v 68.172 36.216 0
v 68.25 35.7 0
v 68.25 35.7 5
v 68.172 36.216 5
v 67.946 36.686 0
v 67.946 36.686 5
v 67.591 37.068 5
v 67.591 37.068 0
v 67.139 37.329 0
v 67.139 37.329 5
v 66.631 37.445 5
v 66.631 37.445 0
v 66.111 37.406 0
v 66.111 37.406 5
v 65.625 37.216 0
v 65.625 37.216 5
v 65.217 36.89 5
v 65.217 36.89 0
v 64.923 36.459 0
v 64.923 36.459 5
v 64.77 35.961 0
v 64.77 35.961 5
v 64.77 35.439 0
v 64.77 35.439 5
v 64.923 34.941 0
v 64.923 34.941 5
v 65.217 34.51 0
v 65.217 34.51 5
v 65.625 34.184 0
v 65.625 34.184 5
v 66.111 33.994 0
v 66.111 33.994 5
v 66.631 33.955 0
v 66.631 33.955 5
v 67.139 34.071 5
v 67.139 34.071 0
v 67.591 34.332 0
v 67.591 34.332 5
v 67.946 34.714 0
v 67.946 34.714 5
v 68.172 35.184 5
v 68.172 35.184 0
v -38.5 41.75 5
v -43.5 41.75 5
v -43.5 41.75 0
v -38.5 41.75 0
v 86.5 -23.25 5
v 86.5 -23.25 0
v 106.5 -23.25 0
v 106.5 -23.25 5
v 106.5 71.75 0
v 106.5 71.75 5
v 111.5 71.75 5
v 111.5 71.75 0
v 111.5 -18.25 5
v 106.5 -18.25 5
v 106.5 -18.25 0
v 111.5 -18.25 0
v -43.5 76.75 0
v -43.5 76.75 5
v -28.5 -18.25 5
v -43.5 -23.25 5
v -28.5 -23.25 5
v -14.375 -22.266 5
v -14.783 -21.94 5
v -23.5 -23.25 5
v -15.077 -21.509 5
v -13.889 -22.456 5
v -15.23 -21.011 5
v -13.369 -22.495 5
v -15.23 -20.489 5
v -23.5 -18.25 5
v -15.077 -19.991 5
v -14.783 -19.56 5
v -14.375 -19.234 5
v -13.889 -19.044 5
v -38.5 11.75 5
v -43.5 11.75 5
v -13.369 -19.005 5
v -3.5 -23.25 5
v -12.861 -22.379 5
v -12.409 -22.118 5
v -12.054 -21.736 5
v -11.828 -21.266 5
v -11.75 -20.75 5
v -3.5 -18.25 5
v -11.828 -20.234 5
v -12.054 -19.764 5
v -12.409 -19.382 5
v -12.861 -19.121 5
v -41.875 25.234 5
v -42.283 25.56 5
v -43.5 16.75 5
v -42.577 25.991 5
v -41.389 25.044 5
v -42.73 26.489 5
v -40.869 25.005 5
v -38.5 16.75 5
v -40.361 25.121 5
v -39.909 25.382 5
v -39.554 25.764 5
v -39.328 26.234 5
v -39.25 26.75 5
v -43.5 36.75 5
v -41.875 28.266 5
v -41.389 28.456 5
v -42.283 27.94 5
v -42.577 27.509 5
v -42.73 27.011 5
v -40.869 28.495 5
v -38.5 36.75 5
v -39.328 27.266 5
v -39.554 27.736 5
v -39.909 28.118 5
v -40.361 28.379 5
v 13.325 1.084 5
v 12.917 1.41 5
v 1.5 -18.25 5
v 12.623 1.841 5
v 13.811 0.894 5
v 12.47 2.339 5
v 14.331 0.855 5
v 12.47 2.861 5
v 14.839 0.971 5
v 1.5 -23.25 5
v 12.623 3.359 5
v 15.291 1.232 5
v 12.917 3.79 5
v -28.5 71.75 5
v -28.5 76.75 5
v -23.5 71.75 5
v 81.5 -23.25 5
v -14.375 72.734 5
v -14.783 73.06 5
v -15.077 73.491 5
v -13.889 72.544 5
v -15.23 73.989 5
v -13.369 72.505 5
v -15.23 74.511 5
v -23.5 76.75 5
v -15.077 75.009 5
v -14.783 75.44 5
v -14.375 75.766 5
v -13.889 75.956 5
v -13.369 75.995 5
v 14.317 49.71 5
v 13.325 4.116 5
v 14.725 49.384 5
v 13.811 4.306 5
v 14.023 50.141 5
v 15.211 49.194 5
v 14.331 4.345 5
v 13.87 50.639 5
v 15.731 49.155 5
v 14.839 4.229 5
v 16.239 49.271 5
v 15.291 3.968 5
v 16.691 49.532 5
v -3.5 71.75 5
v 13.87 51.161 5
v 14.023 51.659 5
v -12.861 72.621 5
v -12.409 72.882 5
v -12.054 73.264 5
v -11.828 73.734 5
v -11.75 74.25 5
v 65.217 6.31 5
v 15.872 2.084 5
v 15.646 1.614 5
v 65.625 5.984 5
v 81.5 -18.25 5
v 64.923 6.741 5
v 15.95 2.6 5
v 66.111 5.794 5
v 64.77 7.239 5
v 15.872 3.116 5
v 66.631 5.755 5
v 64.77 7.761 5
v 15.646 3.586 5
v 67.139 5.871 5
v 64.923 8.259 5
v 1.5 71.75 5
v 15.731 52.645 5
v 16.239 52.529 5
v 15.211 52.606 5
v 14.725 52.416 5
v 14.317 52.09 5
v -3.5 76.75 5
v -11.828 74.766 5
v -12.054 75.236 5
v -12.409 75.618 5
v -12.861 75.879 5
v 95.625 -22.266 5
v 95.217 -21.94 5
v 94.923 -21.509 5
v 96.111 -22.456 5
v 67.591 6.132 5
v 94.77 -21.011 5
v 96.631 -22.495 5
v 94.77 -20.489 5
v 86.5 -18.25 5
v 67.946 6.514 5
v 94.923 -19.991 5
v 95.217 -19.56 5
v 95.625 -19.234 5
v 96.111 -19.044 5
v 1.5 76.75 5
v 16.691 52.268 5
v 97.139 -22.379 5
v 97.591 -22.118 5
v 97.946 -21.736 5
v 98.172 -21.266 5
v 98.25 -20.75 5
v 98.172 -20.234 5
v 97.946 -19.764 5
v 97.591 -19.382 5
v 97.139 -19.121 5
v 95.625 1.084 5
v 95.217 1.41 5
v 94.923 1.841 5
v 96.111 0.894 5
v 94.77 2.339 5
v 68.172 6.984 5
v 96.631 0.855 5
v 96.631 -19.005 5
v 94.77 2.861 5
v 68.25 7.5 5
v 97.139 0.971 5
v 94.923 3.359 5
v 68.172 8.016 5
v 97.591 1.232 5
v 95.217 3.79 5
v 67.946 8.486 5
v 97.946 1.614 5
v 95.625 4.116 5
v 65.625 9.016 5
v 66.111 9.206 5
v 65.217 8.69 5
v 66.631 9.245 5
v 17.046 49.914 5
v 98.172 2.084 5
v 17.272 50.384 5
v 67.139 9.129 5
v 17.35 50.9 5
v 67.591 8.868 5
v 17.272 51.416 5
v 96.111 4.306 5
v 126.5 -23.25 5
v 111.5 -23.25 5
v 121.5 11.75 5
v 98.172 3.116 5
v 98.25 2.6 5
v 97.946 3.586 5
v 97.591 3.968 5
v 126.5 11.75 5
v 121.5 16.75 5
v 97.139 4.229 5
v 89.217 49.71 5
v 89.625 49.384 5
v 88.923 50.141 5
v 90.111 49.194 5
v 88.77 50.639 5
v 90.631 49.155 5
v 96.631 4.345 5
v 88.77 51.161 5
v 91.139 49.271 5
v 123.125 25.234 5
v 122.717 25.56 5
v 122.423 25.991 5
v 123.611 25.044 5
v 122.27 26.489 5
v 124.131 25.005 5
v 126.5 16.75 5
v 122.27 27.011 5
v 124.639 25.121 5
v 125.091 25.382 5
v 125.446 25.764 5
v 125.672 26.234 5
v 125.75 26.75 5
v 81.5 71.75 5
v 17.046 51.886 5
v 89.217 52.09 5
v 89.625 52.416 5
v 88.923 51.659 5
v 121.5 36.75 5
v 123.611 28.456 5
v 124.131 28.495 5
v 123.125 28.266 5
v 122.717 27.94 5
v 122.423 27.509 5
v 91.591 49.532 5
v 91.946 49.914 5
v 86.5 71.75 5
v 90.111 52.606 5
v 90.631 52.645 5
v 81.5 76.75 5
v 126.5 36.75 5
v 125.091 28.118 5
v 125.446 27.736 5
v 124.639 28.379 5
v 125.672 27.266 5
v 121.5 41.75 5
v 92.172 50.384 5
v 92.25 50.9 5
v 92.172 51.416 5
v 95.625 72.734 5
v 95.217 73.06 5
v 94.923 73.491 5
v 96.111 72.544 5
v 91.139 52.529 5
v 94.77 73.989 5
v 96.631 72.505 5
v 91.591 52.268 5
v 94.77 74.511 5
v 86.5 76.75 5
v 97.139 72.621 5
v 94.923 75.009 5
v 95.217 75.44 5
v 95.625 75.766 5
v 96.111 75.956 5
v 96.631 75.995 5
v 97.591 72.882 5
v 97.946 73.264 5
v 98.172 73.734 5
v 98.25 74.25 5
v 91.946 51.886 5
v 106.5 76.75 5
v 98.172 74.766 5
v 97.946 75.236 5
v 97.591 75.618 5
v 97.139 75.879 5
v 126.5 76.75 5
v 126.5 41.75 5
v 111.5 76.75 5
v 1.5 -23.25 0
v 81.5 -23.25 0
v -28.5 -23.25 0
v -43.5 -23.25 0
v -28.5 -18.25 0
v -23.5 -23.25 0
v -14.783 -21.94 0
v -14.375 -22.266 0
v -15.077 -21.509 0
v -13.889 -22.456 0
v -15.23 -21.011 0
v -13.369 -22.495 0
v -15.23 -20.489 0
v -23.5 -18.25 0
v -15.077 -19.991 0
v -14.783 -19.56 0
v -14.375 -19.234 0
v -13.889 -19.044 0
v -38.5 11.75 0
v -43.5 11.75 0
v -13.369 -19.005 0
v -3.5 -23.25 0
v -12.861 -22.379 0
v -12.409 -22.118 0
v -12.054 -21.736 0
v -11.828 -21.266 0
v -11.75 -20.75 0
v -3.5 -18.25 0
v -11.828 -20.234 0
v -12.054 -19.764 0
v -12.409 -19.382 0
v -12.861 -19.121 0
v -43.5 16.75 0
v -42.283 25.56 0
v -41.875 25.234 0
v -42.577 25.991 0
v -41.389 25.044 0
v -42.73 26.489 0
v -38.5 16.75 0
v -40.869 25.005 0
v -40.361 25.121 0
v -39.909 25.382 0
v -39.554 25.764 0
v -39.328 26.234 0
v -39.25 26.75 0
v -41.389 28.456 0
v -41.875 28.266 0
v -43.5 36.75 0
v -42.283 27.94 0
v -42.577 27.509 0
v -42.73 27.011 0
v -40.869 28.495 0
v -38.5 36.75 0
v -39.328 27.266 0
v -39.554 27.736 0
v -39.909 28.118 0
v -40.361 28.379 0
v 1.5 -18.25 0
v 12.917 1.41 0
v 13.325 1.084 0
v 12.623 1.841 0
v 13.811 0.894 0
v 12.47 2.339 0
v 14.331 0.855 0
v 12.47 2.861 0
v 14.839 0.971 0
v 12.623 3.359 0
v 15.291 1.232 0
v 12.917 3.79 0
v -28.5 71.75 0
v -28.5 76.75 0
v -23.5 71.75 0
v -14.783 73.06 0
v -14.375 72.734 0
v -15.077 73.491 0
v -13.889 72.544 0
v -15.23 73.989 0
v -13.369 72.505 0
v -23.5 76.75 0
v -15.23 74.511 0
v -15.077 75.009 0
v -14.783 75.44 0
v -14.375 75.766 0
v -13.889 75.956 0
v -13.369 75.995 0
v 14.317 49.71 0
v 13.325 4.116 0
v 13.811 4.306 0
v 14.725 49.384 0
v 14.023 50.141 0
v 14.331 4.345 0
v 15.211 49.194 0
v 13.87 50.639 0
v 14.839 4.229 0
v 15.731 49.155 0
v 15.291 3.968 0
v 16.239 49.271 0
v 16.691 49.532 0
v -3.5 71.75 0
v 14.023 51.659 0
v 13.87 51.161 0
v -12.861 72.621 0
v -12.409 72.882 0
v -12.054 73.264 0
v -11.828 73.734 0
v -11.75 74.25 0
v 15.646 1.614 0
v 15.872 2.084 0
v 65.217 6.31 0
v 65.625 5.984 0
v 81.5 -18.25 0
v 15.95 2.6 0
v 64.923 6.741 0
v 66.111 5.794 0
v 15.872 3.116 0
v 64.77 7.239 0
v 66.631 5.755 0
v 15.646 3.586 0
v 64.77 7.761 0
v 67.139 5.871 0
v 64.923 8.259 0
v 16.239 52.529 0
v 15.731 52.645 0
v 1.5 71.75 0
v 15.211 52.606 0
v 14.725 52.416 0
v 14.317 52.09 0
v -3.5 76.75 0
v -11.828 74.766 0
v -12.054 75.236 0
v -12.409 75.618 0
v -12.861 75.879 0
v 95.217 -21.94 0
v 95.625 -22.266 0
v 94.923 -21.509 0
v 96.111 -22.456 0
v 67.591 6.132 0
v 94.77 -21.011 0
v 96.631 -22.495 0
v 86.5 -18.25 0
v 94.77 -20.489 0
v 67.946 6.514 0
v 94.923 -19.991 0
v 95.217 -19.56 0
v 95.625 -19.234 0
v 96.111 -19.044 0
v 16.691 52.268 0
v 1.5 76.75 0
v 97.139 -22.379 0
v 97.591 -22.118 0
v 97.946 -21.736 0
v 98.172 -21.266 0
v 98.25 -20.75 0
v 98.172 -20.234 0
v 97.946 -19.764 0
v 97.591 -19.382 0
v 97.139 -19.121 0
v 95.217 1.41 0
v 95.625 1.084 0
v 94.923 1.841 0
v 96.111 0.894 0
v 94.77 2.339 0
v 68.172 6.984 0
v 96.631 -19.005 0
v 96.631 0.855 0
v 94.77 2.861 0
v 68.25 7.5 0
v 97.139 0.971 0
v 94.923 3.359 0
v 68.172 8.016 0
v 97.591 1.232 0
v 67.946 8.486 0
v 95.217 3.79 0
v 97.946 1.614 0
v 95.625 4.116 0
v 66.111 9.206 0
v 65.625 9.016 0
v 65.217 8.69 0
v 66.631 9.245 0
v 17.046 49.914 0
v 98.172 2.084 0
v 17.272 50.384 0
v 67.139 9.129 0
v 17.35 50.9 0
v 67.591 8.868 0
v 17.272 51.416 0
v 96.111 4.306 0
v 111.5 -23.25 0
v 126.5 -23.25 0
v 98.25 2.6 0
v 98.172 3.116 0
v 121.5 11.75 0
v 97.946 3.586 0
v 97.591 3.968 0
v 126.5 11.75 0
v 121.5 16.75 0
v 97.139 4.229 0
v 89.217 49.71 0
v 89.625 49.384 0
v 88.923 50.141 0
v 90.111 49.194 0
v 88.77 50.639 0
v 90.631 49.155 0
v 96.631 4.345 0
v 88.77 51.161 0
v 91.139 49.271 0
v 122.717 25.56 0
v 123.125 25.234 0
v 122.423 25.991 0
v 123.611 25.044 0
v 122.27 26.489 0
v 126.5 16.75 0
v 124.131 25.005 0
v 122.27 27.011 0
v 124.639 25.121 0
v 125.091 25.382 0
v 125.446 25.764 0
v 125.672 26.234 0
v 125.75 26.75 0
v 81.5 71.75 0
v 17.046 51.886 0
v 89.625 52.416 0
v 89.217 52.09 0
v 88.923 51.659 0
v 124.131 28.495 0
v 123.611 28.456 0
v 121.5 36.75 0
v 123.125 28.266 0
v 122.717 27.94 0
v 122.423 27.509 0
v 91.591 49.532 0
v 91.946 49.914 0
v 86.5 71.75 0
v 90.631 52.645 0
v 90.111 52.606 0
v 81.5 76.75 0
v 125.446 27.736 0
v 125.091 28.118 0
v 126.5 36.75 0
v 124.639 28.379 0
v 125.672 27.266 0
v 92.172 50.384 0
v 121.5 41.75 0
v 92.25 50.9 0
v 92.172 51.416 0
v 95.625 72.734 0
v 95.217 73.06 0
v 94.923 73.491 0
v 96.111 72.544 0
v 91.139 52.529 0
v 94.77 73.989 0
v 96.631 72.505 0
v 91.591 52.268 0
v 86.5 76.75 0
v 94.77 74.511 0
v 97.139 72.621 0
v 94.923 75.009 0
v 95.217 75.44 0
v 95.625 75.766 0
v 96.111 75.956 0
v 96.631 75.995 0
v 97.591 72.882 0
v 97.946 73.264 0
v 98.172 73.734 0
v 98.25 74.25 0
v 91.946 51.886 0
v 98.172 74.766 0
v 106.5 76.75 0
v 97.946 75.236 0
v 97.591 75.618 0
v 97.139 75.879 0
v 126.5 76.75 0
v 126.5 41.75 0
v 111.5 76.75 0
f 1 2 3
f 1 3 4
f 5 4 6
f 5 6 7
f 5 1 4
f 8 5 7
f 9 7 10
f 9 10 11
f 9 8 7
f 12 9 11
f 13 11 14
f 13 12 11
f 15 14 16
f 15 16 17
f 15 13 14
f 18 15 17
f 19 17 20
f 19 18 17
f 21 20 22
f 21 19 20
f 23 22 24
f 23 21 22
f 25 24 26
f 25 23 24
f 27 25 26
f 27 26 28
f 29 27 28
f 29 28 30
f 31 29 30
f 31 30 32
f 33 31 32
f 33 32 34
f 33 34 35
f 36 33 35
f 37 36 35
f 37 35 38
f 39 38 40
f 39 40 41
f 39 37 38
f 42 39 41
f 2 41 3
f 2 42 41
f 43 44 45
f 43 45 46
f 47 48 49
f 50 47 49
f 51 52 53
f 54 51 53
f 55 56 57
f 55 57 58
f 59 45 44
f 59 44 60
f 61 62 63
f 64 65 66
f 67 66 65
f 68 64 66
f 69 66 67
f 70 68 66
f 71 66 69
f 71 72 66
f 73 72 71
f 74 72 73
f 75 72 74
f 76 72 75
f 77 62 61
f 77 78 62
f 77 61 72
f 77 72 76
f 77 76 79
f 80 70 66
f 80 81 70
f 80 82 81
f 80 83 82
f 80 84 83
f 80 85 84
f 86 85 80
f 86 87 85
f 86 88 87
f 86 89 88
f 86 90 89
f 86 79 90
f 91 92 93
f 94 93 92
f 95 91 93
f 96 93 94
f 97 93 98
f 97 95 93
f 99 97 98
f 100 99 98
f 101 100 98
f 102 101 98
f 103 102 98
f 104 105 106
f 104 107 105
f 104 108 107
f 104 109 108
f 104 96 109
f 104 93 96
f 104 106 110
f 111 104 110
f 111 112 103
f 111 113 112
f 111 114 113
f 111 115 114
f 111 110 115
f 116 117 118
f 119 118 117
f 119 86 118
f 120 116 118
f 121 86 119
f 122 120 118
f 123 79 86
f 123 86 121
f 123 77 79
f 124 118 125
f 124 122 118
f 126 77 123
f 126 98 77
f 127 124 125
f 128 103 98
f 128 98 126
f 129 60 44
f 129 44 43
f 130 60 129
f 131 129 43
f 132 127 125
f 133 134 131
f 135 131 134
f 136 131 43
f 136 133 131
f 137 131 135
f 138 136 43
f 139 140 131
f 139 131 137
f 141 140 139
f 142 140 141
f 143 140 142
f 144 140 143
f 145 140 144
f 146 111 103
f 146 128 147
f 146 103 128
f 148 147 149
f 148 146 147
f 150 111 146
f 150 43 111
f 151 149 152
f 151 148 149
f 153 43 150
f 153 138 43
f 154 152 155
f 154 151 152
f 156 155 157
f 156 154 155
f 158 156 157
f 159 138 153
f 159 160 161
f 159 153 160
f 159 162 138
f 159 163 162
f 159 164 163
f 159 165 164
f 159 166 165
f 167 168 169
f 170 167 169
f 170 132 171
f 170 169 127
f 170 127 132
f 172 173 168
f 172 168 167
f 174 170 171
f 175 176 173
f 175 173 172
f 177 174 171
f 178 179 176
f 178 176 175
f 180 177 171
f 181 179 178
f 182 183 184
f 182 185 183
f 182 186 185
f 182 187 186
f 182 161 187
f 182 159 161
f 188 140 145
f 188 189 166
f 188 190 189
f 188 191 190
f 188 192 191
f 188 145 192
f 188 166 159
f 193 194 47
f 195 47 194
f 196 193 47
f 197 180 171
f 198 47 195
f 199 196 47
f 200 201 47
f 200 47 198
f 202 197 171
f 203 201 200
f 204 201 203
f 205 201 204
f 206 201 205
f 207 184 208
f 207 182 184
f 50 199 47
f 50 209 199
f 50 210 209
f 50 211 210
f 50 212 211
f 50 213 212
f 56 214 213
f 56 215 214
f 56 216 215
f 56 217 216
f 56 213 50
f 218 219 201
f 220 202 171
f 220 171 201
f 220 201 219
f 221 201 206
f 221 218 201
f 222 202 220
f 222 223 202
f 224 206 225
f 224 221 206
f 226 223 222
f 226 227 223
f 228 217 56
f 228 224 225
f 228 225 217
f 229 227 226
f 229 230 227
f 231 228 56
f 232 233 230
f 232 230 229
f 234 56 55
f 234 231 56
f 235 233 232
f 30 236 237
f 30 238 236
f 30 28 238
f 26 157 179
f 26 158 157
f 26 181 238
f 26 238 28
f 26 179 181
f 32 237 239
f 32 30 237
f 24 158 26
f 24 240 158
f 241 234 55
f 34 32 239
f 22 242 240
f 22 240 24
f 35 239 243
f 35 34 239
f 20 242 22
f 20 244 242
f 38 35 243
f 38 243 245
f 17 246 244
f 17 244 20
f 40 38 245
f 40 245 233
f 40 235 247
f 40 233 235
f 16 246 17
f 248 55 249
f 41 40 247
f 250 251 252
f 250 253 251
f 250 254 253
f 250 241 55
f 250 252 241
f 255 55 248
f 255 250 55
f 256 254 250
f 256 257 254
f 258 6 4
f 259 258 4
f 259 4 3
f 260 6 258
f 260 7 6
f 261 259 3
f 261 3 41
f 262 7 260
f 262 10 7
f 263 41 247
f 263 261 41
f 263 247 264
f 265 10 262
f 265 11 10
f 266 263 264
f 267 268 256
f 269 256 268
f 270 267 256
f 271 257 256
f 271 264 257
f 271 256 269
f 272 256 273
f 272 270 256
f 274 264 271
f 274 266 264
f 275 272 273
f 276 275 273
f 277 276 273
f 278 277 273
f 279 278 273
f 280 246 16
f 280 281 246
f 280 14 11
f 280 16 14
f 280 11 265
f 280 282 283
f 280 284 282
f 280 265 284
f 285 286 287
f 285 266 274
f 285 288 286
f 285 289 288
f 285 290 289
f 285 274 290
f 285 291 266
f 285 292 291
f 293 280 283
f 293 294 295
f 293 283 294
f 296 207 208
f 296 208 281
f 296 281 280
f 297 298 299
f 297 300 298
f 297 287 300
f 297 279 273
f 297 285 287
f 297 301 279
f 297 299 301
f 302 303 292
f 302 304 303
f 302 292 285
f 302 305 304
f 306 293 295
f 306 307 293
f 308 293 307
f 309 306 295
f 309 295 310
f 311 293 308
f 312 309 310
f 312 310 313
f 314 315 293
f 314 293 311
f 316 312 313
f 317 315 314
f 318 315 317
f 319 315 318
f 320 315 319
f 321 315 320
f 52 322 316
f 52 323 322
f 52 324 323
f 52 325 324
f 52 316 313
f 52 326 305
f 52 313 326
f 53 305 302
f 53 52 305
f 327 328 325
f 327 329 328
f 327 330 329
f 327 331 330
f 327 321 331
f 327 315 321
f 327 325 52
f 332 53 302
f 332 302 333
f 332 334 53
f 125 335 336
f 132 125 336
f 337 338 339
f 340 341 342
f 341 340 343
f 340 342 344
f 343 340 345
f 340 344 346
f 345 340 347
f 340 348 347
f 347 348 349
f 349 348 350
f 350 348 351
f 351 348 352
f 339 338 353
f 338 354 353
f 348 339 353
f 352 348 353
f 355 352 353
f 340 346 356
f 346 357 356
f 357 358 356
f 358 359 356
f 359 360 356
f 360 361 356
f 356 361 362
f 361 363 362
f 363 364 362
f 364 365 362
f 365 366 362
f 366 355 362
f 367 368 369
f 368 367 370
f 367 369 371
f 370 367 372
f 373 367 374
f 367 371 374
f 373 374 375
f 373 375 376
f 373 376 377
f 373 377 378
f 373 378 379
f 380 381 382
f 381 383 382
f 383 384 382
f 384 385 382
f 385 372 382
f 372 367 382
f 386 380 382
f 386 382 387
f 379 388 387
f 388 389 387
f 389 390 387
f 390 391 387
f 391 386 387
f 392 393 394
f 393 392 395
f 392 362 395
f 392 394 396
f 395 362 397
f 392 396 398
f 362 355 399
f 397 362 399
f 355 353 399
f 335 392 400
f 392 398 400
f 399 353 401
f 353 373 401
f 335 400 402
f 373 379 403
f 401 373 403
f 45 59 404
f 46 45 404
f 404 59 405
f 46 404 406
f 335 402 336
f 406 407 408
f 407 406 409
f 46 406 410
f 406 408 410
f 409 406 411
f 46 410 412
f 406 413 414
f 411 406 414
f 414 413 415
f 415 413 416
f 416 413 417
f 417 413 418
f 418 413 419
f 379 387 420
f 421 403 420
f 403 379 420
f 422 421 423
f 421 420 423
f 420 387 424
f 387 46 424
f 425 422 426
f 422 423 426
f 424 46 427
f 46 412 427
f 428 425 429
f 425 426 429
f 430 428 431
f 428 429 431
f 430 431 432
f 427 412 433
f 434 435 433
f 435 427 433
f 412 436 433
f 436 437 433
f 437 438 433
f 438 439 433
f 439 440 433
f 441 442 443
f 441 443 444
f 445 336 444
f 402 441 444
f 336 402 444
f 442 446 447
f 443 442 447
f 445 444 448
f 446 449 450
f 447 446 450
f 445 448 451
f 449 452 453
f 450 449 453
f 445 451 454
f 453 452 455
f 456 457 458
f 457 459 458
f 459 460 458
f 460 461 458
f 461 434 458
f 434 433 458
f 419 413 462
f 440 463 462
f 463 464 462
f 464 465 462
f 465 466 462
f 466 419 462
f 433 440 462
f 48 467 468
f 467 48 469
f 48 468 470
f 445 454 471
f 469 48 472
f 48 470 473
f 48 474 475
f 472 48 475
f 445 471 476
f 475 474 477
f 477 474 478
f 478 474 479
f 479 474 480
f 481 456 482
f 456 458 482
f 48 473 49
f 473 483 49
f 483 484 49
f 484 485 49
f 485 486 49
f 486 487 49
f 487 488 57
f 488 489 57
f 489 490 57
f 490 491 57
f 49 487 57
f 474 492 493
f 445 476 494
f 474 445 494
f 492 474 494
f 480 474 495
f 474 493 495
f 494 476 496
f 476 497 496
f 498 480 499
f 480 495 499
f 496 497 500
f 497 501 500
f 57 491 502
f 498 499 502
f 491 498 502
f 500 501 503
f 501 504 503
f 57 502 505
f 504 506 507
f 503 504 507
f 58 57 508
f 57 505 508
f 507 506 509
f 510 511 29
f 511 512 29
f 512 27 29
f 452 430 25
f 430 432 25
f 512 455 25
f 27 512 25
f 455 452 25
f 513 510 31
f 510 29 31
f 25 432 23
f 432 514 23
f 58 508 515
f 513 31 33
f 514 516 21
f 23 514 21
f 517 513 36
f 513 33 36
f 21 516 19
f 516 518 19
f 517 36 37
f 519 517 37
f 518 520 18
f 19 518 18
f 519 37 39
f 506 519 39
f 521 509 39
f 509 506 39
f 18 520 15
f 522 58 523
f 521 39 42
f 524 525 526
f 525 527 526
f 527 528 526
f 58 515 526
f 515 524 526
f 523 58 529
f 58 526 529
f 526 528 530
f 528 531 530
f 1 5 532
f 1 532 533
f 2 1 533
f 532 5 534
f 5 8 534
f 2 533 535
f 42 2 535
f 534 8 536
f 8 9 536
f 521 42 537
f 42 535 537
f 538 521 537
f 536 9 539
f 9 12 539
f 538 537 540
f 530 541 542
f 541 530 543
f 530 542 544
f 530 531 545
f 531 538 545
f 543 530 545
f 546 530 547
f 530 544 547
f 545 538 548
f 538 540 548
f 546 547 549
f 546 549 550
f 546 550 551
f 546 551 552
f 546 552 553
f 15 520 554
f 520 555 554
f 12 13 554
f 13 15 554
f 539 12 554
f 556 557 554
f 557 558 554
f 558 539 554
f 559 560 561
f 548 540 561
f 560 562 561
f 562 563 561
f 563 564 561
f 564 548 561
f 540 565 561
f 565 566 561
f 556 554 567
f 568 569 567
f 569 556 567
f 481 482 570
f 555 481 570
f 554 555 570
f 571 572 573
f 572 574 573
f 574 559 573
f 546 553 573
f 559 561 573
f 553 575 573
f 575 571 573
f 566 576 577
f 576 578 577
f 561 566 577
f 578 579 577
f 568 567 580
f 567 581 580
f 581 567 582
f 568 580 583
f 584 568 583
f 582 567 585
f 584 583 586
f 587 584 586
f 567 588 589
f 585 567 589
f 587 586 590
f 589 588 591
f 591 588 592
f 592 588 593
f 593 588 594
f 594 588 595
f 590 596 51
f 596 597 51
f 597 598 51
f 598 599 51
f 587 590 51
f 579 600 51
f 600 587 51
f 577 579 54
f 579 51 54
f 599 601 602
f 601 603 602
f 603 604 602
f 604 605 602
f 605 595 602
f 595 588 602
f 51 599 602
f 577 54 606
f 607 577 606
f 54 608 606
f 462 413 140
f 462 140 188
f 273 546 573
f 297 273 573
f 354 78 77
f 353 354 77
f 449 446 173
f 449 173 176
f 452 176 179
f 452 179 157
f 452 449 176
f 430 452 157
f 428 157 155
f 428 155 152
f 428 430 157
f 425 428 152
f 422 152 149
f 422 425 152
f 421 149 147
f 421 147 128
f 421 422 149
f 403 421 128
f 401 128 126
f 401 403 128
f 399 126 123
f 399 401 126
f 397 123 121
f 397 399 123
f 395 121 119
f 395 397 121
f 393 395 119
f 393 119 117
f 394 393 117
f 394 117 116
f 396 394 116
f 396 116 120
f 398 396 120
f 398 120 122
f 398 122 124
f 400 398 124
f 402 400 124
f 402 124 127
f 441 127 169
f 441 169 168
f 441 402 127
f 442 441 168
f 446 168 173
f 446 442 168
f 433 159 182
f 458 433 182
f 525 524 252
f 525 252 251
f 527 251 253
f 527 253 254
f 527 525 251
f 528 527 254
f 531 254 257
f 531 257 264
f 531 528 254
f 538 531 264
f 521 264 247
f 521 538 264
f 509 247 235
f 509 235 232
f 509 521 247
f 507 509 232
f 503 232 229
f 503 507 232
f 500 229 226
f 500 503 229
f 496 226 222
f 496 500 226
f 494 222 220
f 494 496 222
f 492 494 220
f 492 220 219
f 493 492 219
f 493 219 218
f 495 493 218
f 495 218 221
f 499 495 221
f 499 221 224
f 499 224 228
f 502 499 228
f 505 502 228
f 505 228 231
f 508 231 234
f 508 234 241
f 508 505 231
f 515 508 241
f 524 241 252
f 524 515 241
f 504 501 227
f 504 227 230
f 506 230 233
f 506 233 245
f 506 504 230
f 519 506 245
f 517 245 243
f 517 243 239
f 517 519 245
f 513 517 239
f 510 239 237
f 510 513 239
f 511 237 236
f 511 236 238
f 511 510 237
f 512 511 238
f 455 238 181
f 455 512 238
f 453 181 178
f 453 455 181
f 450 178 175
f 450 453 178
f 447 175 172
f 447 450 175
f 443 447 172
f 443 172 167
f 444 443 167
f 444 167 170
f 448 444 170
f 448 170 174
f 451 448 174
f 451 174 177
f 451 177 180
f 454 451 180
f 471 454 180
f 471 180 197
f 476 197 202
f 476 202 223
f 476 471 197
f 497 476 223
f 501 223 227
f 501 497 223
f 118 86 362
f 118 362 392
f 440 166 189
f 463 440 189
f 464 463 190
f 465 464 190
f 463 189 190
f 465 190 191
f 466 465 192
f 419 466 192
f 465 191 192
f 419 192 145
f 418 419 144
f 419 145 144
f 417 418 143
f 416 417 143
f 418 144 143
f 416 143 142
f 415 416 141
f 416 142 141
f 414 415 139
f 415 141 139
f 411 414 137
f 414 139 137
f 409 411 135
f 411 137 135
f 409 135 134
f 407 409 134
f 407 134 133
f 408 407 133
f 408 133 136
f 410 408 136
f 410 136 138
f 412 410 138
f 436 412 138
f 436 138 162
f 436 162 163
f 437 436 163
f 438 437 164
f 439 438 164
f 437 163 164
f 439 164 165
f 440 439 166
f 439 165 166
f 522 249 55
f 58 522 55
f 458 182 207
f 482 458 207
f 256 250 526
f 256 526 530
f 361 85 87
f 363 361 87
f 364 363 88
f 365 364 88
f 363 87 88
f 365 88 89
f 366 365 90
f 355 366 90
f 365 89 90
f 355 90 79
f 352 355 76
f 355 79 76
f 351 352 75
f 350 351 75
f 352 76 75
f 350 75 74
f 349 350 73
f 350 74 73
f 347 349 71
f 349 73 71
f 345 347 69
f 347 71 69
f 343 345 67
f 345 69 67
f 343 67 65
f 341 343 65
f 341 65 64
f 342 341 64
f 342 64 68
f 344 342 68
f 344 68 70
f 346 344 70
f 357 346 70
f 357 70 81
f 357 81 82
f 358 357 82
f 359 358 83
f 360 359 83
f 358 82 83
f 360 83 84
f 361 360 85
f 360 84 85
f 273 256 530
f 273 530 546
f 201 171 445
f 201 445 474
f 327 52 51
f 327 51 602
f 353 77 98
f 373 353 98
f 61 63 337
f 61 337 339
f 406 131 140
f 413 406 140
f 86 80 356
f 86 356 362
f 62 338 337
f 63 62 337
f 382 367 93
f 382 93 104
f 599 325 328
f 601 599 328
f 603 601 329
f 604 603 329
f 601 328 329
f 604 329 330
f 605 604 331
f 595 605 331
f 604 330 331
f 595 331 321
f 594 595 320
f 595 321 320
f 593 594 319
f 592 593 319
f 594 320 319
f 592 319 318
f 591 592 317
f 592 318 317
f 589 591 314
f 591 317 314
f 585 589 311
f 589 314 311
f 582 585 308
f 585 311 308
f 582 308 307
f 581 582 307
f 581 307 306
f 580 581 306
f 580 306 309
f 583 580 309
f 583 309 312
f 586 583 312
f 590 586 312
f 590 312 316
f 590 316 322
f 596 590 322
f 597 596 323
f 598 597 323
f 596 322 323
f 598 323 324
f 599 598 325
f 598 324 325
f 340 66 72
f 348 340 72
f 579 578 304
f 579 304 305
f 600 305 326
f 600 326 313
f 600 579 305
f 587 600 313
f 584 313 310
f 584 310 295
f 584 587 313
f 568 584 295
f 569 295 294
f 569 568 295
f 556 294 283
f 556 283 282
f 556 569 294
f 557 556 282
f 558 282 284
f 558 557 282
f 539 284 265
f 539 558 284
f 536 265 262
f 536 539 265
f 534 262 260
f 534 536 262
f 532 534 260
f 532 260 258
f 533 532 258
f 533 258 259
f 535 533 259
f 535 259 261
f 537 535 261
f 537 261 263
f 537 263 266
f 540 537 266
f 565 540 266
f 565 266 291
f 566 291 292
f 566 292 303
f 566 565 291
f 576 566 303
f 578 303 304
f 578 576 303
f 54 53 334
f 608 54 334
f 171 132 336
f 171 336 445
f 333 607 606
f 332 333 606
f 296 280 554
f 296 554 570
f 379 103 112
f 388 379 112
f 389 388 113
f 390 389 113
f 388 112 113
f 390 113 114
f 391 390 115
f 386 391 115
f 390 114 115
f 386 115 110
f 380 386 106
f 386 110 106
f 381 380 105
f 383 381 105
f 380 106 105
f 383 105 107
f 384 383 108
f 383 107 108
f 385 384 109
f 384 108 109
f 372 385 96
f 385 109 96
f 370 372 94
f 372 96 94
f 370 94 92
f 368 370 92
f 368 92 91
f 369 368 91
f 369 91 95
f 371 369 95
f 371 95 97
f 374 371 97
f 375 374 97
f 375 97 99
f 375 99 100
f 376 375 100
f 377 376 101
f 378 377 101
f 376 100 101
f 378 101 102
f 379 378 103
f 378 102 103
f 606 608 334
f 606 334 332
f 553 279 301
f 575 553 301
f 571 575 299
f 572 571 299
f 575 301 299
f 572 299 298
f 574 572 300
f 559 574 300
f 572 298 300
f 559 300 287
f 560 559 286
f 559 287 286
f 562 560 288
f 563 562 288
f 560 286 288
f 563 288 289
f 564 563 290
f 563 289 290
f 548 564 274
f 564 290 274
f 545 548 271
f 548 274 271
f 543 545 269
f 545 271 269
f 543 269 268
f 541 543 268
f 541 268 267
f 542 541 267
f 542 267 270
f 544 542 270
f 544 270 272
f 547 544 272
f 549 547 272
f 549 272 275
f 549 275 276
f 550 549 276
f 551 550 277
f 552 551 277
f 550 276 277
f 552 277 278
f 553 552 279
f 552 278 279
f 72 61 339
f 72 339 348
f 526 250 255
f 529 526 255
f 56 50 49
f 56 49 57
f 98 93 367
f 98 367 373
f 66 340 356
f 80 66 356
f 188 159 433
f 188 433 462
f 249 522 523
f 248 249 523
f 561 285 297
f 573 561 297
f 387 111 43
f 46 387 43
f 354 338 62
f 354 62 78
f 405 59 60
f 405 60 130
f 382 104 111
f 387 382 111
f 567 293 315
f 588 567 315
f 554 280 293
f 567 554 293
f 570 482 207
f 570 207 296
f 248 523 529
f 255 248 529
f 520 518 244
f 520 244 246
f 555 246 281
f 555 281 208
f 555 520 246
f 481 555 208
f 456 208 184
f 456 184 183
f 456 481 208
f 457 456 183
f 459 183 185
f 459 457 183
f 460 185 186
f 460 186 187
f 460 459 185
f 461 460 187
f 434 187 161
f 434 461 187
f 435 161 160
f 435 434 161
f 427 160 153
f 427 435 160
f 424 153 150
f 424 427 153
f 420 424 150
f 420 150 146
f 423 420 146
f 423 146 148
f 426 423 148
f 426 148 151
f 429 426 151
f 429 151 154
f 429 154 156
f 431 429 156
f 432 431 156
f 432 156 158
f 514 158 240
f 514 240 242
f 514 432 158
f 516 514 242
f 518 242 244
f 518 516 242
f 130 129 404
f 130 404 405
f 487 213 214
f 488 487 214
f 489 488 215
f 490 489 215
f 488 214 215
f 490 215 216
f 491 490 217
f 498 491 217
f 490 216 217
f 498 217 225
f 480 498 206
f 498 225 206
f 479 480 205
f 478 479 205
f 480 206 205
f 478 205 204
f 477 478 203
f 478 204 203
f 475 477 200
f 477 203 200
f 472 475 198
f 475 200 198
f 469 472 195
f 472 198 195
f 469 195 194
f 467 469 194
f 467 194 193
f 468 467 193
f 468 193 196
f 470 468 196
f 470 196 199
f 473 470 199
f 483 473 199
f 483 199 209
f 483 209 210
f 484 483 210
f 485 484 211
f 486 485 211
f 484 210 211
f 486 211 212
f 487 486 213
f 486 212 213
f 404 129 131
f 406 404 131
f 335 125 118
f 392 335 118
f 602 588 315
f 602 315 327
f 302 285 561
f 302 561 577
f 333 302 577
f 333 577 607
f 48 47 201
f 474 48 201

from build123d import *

# Parameters (mm, degrees)
F1_W     = 170
F1_H     = 100
F1_R     = 1.75
F2_DEPTH = 5
F3_W     = 5
F3_H     = 5
F3_R     = 1.75
F4_DEPTH = 5


with BuildPart() as f2:
    # F1 (on Top) → F2 (new body)
    with BuildSketch(Plane.XY):
        with Locations((41.5, 26.75)):
            Rectangle(F1_W, F1_H)
        with Locations((14.2, 2.6)):
            Circle(F1_R, mode=Mode.SUBTRACT)
        with Locations((66.5, 7.5)):
            Circle(F1_R, mode=Mode.SUBTRACT)
        with Locations((96.5, 2.6)):
            Circle(F1_R, mode=Mode.SUBTRACT)
        with Locations((15.6, 50.9)):
            Circle(F1_R, mode=Mode.SUBTRACT)
        with Locations((66.5, 35.7)):
            Circle(F1_R, mode=Mode.SUBTRACT)
        with Locations((90.5, 50.9)):
            Circle(F1_R, mode=Mode.SUBTRACT)
    extrude(amount=F2_DEPTH)

    # F3 (on face) → F4 (cut, through all)
    with BuildSketch(Plane.XY.offset(5)):
        with Locations((-26, -20.75)):
            Rectangle(F3_W, F3_H)
        with Locations((-1, -20.75)):
            Rectangle(F3_W, F3_H)
        with Locations((-13.5, -20.75)):
            Circle(F3_R)
        with Locations((84, -20.75)):
            Rectangle(F3_W, F3_H)
        with Locations((96.5, -20.75)):
            Circle(F3_R)
        with Locations((109, -20.75)):
            Rectangle(F3_W, F3_H)
        with Locations((109, 74.25)):
            Rectangle(F3_W, F3_H)
        with Locations((84, 74.25)):
            Rectangle(F3_W, F3_H)
        with Locations((-26, 74.25)):
            Rectangle(F3_W, F3_H)
        with Locations((-13.5, 74.25)):
            Circle(F3_R)
        with Locations((-1, 74.25)):
            Rectangle(F3_W, F3_H)
        with Locations((96.5, 74.25)):
            Circle(F3_R)
        with Locations((-41, 39.25)):
            Rectangle(F3_W, F3_H)
        with Locations((-41, 14.25)):
            Rectangle(F3_W, F3_H)
        with Locations((-41, 26.75)):
            Circle(F3_R)
        with Locations((124, 39.25)):
            Rectangle(F3_W, F3_H)
        with Locations((124, 14.25)):
            Rectangle(F3_W, F3_H)
        with Locations((124, 26.75)):
            Circle(F3_R)
    extrude(amount=-F4_DEPTH, mode=Mode.SUBTRACT)


solid = f2.part
